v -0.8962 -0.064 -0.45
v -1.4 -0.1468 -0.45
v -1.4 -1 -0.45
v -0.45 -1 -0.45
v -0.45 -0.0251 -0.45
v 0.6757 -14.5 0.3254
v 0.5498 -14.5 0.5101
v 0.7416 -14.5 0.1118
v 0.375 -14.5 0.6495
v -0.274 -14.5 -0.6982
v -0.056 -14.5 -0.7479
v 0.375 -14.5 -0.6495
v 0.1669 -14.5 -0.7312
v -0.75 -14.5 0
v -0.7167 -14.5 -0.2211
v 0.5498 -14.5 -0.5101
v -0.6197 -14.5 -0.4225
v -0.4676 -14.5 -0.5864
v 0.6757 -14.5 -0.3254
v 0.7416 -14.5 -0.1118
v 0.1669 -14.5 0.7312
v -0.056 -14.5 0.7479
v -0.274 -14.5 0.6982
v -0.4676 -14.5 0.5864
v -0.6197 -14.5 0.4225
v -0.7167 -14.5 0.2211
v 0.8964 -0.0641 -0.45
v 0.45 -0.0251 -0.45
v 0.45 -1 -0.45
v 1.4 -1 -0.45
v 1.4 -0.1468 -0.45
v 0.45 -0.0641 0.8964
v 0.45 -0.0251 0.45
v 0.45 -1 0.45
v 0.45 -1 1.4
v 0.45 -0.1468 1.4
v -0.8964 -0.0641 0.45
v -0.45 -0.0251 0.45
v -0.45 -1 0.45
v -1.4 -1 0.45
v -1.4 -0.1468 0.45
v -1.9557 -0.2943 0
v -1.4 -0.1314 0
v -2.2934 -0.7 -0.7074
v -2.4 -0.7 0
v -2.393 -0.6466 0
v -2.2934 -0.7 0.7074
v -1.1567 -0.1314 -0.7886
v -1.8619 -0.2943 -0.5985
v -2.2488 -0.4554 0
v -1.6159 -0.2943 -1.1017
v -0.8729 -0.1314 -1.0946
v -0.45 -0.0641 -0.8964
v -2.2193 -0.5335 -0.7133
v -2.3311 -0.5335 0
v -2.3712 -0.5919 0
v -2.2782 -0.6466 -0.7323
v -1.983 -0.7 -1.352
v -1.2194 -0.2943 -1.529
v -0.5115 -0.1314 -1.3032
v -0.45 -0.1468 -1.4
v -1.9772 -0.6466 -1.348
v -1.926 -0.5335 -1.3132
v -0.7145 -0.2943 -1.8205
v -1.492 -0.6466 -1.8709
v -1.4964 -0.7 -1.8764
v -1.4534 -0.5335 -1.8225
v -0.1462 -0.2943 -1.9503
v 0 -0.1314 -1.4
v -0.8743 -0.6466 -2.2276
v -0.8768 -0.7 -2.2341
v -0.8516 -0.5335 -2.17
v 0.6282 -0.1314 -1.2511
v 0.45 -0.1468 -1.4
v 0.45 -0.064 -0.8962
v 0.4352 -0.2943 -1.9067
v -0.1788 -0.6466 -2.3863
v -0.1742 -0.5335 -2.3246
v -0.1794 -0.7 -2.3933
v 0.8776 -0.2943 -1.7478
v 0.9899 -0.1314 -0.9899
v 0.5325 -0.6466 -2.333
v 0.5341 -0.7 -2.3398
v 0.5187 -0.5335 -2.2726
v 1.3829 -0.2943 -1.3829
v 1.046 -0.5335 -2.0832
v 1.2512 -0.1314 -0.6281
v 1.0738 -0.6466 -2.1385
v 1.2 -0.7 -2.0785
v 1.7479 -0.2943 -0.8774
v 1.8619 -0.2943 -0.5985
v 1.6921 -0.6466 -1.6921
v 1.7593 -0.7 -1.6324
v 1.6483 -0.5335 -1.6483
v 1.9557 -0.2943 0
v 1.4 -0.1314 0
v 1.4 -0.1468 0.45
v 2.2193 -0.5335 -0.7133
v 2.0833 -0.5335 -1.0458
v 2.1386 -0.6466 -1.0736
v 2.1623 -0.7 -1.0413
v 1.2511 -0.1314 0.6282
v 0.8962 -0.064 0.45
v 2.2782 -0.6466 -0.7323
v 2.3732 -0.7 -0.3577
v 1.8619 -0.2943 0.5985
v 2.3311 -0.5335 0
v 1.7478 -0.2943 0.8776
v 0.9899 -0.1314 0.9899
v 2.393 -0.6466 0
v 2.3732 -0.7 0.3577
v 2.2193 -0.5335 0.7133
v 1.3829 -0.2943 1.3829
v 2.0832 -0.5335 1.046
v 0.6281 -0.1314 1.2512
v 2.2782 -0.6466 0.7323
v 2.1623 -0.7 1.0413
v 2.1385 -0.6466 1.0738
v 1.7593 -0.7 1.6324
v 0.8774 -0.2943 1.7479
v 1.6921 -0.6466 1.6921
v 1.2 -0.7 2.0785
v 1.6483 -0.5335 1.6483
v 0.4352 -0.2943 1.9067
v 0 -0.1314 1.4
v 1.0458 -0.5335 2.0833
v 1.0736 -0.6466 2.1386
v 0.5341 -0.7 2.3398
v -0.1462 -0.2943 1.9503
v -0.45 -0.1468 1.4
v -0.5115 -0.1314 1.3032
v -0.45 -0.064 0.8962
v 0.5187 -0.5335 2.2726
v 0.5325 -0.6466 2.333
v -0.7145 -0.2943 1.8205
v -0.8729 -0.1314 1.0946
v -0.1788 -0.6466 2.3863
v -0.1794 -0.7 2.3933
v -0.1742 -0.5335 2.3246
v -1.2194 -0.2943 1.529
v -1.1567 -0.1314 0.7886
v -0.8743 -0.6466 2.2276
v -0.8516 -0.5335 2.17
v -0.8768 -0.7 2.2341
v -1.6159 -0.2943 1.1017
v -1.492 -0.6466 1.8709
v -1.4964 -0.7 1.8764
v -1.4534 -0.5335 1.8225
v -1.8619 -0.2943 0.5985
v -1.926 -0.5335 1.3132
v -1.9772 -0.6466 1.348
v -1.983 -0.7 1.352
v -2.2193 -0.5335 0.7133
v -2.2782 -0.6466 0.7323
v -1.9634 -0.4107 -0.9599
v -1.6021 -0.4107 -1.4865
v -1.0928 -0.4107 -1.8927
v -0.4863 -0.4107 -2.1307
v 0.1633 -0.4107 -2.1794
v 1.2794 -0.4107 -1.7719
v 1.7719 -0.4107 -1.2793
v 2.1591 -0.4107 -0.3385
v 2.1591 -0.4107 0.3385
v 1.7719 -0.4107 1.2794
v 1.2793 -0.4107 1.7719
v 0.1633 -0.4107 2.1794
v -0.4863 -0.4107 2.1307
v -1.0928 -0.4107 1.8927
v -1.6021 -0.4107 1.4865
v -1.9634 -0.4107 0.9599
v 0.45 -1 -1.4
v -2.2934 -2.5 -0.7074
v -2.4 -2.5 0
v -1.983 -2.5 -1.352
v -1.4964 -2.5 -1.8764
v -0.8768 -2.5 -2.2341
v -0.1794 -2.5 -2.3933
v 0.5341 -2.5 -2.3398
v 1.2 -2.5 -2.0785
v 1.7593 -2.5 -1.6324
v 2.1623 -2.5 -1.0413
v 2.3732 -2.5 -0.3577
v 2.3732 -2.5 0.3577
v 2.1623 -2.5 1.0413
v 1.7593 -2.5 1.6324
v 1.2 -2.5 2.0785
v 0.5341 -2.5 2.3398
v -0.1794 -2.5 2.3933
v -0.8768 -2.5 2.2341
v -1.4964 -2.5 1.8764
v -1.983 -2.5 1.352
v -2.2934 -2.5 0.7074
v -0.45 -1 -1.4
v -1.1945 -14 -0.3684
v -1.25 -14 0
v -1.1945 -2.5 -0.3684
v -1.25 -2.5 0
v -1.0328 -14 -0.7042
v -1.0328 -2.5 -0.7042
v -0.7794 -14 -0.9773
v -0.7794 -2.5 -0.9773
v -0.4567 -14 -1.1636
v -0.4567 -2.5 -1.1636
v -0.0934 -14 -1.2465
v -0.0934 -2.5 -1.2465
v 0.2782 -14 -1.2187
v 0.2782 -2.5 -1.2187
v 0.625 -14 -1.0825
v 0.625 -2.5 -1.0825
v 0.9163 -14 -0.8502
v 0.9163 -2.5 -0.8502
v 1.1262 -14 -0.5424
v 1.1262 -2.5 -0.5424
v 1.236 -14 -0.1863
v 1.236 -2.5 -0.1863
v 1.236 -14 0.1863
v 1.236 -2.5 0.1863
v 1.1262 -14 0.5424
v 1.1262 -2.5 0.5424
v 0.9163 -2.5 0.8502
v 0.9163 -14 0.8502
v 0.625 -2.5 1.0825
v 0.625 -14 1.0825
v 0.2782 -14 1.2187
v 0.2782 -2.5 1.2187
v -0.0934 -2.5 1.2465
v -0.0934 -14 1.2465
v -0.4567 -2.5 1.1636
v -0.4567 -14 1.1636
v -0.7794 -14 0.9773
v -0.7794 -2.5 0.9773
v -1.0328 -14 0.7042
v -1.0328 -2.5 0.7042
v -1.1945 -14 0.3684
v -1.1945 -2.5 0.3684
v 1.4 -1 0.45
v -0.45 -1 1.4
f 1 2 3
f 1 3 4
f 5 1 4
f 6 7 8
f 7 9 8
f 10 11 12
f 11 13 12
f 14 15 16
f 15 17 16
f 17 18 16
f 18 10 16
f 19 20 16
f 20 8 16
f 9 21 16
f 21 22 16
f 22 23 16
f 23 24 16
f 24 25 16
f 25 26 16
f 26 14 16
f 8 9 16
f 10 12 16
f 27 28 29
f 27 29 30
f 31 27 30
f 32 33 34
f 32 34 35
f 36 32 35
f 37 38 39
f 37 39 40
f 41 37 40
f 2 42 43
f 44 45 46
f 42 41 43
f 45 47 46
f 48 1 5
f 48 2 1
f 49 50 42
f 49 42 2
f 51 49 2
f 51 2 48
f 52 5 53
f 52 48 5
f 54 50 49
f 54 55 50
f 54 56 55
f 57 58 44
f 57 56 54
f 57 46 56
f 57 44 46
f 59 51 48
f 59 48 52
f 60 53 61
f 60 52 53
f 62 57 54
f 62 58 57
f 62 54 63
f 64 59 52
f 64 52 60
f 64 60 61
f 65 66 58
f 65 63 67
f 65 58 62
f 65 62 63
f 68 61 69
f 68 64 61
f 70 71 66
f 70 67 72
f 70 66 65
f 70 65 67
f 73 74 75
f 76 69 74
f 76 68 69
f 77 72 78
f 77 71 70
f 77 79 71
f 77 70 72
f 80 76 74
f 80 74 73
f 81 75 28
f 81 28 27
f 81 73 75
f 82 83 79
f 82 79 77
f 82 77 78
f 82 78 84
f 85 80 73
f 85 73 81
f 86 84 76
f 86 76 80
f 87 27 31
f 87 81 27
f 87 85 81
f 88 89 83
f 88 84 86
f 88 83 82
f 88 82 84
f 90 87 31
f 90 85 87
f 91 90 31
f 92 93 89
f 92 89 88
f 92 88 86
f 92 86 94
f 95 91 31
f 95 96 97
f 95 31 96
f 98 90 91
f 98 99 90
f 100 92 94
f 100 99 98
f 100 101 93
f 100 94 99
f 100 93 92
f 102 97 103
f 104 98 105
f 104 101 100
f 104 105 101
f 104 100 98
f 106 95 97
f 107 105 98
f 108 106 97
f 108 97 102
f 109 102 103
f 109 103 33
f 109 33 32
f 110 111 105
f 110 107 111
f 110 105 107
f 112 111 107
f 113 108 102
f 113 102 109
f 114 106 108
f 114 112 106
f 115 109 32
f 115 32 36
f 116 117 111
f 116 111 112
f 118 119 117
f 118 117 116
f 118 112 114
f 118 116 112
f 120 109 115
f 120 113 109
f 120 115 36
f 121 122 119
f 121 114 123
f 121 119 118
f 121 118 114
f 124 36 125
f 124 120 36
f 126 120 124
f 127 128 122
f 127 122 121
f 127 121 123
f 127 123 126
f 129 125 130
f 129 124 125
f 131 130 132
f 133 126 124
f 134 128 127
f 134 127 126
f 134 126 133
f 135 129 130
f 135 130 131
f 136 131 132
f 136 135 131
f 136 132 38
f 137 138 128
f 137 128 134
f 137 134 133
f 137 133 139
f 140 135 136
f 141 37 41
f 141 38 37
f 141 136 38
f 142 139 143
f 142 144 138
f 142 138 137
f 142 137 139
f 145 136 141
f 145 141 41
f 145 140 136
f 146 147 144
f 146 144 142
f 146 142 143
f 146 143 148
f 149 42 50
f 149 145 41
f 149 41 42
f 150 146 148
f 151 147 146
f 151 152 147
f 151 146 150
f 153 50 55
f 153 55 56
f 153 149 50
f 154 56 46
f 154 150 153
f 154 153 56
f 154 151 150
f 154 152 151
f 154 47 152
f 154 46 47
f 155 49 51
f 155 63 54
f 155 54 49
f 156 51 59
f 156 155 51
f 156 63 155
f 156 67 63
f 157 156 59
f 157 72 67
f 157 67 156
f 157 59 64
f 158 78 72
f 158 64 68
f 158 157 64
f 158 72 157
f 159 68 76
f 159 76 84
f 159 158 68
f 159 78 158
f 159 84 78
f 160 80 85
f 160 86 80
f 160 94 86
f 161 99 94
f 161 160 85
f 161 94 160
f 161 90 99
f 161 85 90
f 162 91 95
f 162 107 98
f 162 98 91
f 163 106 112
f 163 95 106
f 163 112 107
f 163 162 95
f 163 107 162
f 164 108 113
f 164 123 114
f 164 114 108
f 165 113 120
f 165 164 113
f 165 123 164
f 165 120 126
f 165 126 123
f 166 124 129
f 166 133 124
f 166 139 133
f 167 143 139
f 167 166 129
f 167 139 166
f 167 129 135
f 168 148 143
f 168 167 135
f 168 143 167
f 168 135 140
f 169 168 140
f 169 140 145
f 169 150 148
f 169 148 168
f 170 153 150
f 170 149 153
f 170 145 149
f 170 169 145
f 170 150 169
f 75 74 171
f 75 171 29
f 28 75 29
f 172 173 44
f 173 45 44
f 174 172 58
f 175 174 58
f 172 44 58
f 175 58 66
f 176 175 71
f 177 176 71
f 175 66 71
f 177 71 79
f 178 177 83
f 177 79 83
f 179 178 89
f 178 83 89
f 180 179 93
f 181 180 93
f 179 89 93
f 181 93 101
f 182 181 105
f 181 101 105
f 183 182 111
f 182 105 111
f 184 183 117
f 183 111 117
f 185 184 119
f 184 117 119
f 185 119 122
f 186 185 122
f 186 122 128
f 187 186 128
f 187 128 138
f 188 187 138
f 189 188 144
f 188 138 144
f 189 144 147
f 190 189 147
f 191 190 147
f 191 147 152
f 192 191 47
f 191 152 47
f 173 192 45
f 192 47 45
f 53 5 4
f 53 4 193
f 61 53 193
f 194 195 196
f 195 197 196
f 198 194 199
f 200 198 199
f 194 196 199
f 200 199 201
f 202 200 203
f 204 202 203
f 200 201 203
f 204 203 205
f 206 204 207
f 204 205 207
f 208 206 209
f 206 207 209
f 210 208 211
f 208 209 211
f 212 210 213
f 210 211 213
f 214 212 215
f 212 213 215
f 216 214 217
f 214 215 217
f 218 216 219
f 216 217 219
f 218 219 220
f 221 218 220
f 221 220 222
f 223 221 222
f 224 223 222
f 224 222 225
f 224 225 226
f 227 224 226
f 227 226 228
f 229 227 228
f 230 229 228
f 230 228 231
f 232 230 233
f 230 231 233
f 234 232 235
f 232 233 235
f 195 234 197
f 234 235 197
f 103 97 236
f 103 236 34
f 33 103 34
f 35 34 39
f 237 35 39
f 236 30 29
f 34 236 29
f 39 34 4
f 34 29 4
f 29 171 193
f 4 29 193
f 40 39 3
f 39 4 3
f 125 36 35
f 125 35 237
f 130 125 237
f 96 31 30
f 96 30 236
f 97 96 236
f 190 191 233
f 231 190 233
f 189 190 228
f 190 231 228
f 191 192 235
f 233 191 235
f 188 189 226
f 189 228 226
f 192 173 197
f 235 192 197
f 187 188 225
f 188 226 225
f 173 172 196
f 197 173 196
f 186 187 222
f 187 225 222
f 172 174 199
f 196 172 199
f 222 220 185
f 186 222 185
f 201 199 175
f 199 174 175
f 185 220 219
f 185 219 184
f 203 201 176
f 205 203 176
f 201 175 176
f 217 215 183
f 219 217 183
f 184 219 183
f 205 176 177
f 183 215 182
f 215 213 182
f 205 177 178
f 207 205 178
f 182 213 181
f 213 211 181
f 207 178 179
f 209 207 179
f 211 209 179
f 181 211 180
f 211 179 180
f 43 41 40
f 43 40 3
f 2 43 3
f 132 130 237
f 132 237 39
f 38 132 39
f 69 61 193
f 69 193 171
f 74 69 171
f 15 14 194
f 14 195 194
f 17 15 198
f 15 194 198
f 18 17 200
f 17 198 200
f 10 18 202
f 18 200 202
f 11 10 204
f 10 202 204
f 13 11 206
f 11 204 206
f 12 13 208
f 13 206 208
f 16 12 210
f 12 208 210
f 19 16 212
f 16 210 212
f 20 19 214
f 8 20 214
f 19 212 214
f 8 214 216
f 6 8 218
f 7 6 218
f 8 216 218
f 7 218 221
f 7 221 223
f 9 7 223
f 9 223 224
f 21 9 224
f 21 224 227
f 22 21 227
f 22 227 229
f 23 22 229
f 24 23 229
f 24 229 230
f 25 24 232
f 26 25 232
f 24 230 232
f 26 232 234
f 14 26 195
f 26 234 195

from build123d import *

# Parameters (mm, degrees)
CUT_EXTRUDE1_DEPTH = 1


with BuildPart() as part:
    # Sketch2 → Revolve1 (revolve)
    with BuildSketch(Plane.XY):
        with BuildLine():
            Line((-2.4, -2.5), (-2.4, -0.7))
            add(Edge.make_bspline(
                [(0, 0), (-2.4, 0), (-2.4, -0.7)],
                knots=[4.71238898, 4.71238898, 4.71238898, 6.283185307, 6.283185307, 6.283185307], degree=2, weights=[1, 0.707106781, 1]))
            Line((0, 0), (0, -14.5))
            Line((0, -14.5), (-0.75, -14.5))
            Line((-0.75, -14.5), (-1.25, -14))
            Line((-1.25, -14), (-1.25, -2.5))
            Line((-1.25, -2.5), (-2.4, -2.5))
        make_face()
    revolve(axis=Axis((0, 0, 0), (0, -1, 0)))

    # Sketch3 → Cut-Extrude1 (cut)
    with BuildSketch(Plane(origin=(0, 0, 0), x_dir=(1, 0, 0), z_dir=(0, 1, 0))):
        Polygon((-0.45, 1.4), (0.45, 1.4), (0.45, 0.45), (1.4, 0.45), (1.4, -0.45), (0.45, -0.45), (0.45, -1.4), (-0.45, -1.4), (-0.45, -0.45), (-1.4, -0.45), (-1.4, 0.45), (-0.45, 0.45), align=None)
    extrude(amount=-CUT_EXTRUDE1_DEPTH, mode=Mode.SUBTRACT)


solid = part.part
